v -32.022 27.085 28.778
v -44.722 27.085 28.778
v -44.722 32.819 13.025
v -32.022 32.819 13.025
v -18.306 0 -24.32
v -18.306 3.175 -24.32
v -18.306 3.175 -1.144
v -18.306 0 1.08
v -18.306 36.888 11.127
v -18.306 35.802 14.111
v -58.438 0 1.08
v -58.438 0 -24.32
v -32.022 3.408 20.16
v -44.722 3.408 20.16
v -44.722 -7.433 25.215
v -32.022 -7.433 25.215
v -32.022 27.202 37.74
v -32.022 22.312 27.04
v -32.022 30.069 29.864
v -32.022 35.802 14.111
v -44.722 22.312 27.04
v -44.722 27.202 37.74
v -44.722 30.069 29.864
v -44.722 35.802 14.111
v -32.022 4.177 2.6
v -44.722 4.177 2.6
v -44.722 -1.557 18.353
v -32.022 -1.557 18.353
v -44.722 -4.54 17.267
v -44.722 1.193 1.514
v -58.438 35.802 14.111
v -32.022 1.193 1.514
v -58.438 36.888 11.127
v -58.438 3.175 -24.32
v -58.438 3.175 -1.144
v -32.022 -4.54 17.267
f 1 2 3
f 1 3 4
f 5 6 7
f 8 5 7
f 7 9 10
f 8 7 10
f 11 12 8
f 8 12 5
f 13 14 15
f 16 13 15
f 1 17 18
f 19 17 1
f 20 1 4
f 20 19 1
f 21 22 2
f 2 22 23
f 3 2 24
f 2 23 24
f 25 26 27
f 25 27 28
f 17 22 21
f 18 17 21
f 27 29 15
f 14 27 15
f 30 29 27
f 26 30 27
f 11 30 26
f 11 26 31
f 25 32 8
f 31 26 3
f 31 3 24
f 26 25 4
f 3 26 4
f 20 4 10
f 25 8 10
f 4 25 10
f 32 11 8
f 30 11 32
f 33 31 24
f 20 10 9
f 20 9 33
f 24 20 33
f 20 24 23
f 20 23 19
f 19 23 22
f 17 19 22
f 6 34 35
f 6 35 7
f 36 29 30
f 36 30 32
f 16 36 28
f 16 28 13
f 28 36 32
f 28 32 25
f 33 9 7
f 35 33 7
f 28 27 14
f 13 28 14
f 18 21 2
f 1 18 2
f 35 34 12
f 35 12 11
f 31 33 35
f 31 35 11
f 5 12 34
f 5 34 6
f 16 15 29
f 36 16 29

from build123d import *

# Parameters (mm, degrees)
SKETCH2_W           = 40.132
SKETCH2_H           = 25.4
BOSS_EXTRUDE1_DEPTH = 3.175
BOSS_EXTRUDE2_DEPTH = 40.132
SKETCH5_W           = 12.7
SKETCH5_H           = 3.175
BOSS_EXTRUDE3_DEPTH = 16.764
BOSS_EXTRUDE4_DEPTH = 12.7


with BuildPart() as part:
    # Sketch2 → Boss-Extrude1 (new body)
    with BuildSketch(Plane(origin=(0, 0, 0), x_dir=(1, 0, 0), z_dir=(0, 1, 0))):
        with Locations((-38.371824561, 11.620425731)):
            Rectangle(SKETCH2_W, SKETCH2_H)
    extrude(amount=BOSS_EXTRUDE1_DEPTH)

    # Sketch3 → Boss-Extrude2 (add)
    with BuildSketch(Plane(origin=(-18.305824561, 0, 0), x_dir=(0, 0, -1), z_dir=(1, 0, 0))):
        Polygon((-1.079574269, 0), (-14.11054173, 35.802288852), (-11.127017659, 36.888202807), (1.143584665, 3.175), align=None)
    extrude(amount=-BOSS_EXTRUDE2_DEPTH)

    # Sketch5 → Boss-Extrude3 (add)
    with BuildSketch(Plane(origin=(0, -0.346968482, 0.953288069), x_dir=(1, 0, 0), z_dir=(0, -0.34202014332566316, 0.9396926207859104))):
        with Locations((-38.371824561, 36.881736146)):
            Rectangle(SKETCH5_W, SKETCH5_H)
        with Locations((-38.371824561, 3.226736146)):
            Rectangle(SKETCH5_W, SKETCH5_H)
    extrude(amount=BOSS_EXTRUDE3_DEPTH)

    # Sketch6 → Boss-Extrude4 (add)
    with BuildSketch(Plane.ZY.offset(44.721824561)):
        Polygon((29.863548825, 30.068663169), (37.740052372, 27.201850328), (27.040172541, 22.311500585), align=None)
        Polygon((17.266946946, -4.540216054), (20.159821722, 3.407892071), (25.215055071, -7.433090831), align=None)
    extrude(amount=-BOSS_EXTRUDE4_DEPTH)


solid = part.part
